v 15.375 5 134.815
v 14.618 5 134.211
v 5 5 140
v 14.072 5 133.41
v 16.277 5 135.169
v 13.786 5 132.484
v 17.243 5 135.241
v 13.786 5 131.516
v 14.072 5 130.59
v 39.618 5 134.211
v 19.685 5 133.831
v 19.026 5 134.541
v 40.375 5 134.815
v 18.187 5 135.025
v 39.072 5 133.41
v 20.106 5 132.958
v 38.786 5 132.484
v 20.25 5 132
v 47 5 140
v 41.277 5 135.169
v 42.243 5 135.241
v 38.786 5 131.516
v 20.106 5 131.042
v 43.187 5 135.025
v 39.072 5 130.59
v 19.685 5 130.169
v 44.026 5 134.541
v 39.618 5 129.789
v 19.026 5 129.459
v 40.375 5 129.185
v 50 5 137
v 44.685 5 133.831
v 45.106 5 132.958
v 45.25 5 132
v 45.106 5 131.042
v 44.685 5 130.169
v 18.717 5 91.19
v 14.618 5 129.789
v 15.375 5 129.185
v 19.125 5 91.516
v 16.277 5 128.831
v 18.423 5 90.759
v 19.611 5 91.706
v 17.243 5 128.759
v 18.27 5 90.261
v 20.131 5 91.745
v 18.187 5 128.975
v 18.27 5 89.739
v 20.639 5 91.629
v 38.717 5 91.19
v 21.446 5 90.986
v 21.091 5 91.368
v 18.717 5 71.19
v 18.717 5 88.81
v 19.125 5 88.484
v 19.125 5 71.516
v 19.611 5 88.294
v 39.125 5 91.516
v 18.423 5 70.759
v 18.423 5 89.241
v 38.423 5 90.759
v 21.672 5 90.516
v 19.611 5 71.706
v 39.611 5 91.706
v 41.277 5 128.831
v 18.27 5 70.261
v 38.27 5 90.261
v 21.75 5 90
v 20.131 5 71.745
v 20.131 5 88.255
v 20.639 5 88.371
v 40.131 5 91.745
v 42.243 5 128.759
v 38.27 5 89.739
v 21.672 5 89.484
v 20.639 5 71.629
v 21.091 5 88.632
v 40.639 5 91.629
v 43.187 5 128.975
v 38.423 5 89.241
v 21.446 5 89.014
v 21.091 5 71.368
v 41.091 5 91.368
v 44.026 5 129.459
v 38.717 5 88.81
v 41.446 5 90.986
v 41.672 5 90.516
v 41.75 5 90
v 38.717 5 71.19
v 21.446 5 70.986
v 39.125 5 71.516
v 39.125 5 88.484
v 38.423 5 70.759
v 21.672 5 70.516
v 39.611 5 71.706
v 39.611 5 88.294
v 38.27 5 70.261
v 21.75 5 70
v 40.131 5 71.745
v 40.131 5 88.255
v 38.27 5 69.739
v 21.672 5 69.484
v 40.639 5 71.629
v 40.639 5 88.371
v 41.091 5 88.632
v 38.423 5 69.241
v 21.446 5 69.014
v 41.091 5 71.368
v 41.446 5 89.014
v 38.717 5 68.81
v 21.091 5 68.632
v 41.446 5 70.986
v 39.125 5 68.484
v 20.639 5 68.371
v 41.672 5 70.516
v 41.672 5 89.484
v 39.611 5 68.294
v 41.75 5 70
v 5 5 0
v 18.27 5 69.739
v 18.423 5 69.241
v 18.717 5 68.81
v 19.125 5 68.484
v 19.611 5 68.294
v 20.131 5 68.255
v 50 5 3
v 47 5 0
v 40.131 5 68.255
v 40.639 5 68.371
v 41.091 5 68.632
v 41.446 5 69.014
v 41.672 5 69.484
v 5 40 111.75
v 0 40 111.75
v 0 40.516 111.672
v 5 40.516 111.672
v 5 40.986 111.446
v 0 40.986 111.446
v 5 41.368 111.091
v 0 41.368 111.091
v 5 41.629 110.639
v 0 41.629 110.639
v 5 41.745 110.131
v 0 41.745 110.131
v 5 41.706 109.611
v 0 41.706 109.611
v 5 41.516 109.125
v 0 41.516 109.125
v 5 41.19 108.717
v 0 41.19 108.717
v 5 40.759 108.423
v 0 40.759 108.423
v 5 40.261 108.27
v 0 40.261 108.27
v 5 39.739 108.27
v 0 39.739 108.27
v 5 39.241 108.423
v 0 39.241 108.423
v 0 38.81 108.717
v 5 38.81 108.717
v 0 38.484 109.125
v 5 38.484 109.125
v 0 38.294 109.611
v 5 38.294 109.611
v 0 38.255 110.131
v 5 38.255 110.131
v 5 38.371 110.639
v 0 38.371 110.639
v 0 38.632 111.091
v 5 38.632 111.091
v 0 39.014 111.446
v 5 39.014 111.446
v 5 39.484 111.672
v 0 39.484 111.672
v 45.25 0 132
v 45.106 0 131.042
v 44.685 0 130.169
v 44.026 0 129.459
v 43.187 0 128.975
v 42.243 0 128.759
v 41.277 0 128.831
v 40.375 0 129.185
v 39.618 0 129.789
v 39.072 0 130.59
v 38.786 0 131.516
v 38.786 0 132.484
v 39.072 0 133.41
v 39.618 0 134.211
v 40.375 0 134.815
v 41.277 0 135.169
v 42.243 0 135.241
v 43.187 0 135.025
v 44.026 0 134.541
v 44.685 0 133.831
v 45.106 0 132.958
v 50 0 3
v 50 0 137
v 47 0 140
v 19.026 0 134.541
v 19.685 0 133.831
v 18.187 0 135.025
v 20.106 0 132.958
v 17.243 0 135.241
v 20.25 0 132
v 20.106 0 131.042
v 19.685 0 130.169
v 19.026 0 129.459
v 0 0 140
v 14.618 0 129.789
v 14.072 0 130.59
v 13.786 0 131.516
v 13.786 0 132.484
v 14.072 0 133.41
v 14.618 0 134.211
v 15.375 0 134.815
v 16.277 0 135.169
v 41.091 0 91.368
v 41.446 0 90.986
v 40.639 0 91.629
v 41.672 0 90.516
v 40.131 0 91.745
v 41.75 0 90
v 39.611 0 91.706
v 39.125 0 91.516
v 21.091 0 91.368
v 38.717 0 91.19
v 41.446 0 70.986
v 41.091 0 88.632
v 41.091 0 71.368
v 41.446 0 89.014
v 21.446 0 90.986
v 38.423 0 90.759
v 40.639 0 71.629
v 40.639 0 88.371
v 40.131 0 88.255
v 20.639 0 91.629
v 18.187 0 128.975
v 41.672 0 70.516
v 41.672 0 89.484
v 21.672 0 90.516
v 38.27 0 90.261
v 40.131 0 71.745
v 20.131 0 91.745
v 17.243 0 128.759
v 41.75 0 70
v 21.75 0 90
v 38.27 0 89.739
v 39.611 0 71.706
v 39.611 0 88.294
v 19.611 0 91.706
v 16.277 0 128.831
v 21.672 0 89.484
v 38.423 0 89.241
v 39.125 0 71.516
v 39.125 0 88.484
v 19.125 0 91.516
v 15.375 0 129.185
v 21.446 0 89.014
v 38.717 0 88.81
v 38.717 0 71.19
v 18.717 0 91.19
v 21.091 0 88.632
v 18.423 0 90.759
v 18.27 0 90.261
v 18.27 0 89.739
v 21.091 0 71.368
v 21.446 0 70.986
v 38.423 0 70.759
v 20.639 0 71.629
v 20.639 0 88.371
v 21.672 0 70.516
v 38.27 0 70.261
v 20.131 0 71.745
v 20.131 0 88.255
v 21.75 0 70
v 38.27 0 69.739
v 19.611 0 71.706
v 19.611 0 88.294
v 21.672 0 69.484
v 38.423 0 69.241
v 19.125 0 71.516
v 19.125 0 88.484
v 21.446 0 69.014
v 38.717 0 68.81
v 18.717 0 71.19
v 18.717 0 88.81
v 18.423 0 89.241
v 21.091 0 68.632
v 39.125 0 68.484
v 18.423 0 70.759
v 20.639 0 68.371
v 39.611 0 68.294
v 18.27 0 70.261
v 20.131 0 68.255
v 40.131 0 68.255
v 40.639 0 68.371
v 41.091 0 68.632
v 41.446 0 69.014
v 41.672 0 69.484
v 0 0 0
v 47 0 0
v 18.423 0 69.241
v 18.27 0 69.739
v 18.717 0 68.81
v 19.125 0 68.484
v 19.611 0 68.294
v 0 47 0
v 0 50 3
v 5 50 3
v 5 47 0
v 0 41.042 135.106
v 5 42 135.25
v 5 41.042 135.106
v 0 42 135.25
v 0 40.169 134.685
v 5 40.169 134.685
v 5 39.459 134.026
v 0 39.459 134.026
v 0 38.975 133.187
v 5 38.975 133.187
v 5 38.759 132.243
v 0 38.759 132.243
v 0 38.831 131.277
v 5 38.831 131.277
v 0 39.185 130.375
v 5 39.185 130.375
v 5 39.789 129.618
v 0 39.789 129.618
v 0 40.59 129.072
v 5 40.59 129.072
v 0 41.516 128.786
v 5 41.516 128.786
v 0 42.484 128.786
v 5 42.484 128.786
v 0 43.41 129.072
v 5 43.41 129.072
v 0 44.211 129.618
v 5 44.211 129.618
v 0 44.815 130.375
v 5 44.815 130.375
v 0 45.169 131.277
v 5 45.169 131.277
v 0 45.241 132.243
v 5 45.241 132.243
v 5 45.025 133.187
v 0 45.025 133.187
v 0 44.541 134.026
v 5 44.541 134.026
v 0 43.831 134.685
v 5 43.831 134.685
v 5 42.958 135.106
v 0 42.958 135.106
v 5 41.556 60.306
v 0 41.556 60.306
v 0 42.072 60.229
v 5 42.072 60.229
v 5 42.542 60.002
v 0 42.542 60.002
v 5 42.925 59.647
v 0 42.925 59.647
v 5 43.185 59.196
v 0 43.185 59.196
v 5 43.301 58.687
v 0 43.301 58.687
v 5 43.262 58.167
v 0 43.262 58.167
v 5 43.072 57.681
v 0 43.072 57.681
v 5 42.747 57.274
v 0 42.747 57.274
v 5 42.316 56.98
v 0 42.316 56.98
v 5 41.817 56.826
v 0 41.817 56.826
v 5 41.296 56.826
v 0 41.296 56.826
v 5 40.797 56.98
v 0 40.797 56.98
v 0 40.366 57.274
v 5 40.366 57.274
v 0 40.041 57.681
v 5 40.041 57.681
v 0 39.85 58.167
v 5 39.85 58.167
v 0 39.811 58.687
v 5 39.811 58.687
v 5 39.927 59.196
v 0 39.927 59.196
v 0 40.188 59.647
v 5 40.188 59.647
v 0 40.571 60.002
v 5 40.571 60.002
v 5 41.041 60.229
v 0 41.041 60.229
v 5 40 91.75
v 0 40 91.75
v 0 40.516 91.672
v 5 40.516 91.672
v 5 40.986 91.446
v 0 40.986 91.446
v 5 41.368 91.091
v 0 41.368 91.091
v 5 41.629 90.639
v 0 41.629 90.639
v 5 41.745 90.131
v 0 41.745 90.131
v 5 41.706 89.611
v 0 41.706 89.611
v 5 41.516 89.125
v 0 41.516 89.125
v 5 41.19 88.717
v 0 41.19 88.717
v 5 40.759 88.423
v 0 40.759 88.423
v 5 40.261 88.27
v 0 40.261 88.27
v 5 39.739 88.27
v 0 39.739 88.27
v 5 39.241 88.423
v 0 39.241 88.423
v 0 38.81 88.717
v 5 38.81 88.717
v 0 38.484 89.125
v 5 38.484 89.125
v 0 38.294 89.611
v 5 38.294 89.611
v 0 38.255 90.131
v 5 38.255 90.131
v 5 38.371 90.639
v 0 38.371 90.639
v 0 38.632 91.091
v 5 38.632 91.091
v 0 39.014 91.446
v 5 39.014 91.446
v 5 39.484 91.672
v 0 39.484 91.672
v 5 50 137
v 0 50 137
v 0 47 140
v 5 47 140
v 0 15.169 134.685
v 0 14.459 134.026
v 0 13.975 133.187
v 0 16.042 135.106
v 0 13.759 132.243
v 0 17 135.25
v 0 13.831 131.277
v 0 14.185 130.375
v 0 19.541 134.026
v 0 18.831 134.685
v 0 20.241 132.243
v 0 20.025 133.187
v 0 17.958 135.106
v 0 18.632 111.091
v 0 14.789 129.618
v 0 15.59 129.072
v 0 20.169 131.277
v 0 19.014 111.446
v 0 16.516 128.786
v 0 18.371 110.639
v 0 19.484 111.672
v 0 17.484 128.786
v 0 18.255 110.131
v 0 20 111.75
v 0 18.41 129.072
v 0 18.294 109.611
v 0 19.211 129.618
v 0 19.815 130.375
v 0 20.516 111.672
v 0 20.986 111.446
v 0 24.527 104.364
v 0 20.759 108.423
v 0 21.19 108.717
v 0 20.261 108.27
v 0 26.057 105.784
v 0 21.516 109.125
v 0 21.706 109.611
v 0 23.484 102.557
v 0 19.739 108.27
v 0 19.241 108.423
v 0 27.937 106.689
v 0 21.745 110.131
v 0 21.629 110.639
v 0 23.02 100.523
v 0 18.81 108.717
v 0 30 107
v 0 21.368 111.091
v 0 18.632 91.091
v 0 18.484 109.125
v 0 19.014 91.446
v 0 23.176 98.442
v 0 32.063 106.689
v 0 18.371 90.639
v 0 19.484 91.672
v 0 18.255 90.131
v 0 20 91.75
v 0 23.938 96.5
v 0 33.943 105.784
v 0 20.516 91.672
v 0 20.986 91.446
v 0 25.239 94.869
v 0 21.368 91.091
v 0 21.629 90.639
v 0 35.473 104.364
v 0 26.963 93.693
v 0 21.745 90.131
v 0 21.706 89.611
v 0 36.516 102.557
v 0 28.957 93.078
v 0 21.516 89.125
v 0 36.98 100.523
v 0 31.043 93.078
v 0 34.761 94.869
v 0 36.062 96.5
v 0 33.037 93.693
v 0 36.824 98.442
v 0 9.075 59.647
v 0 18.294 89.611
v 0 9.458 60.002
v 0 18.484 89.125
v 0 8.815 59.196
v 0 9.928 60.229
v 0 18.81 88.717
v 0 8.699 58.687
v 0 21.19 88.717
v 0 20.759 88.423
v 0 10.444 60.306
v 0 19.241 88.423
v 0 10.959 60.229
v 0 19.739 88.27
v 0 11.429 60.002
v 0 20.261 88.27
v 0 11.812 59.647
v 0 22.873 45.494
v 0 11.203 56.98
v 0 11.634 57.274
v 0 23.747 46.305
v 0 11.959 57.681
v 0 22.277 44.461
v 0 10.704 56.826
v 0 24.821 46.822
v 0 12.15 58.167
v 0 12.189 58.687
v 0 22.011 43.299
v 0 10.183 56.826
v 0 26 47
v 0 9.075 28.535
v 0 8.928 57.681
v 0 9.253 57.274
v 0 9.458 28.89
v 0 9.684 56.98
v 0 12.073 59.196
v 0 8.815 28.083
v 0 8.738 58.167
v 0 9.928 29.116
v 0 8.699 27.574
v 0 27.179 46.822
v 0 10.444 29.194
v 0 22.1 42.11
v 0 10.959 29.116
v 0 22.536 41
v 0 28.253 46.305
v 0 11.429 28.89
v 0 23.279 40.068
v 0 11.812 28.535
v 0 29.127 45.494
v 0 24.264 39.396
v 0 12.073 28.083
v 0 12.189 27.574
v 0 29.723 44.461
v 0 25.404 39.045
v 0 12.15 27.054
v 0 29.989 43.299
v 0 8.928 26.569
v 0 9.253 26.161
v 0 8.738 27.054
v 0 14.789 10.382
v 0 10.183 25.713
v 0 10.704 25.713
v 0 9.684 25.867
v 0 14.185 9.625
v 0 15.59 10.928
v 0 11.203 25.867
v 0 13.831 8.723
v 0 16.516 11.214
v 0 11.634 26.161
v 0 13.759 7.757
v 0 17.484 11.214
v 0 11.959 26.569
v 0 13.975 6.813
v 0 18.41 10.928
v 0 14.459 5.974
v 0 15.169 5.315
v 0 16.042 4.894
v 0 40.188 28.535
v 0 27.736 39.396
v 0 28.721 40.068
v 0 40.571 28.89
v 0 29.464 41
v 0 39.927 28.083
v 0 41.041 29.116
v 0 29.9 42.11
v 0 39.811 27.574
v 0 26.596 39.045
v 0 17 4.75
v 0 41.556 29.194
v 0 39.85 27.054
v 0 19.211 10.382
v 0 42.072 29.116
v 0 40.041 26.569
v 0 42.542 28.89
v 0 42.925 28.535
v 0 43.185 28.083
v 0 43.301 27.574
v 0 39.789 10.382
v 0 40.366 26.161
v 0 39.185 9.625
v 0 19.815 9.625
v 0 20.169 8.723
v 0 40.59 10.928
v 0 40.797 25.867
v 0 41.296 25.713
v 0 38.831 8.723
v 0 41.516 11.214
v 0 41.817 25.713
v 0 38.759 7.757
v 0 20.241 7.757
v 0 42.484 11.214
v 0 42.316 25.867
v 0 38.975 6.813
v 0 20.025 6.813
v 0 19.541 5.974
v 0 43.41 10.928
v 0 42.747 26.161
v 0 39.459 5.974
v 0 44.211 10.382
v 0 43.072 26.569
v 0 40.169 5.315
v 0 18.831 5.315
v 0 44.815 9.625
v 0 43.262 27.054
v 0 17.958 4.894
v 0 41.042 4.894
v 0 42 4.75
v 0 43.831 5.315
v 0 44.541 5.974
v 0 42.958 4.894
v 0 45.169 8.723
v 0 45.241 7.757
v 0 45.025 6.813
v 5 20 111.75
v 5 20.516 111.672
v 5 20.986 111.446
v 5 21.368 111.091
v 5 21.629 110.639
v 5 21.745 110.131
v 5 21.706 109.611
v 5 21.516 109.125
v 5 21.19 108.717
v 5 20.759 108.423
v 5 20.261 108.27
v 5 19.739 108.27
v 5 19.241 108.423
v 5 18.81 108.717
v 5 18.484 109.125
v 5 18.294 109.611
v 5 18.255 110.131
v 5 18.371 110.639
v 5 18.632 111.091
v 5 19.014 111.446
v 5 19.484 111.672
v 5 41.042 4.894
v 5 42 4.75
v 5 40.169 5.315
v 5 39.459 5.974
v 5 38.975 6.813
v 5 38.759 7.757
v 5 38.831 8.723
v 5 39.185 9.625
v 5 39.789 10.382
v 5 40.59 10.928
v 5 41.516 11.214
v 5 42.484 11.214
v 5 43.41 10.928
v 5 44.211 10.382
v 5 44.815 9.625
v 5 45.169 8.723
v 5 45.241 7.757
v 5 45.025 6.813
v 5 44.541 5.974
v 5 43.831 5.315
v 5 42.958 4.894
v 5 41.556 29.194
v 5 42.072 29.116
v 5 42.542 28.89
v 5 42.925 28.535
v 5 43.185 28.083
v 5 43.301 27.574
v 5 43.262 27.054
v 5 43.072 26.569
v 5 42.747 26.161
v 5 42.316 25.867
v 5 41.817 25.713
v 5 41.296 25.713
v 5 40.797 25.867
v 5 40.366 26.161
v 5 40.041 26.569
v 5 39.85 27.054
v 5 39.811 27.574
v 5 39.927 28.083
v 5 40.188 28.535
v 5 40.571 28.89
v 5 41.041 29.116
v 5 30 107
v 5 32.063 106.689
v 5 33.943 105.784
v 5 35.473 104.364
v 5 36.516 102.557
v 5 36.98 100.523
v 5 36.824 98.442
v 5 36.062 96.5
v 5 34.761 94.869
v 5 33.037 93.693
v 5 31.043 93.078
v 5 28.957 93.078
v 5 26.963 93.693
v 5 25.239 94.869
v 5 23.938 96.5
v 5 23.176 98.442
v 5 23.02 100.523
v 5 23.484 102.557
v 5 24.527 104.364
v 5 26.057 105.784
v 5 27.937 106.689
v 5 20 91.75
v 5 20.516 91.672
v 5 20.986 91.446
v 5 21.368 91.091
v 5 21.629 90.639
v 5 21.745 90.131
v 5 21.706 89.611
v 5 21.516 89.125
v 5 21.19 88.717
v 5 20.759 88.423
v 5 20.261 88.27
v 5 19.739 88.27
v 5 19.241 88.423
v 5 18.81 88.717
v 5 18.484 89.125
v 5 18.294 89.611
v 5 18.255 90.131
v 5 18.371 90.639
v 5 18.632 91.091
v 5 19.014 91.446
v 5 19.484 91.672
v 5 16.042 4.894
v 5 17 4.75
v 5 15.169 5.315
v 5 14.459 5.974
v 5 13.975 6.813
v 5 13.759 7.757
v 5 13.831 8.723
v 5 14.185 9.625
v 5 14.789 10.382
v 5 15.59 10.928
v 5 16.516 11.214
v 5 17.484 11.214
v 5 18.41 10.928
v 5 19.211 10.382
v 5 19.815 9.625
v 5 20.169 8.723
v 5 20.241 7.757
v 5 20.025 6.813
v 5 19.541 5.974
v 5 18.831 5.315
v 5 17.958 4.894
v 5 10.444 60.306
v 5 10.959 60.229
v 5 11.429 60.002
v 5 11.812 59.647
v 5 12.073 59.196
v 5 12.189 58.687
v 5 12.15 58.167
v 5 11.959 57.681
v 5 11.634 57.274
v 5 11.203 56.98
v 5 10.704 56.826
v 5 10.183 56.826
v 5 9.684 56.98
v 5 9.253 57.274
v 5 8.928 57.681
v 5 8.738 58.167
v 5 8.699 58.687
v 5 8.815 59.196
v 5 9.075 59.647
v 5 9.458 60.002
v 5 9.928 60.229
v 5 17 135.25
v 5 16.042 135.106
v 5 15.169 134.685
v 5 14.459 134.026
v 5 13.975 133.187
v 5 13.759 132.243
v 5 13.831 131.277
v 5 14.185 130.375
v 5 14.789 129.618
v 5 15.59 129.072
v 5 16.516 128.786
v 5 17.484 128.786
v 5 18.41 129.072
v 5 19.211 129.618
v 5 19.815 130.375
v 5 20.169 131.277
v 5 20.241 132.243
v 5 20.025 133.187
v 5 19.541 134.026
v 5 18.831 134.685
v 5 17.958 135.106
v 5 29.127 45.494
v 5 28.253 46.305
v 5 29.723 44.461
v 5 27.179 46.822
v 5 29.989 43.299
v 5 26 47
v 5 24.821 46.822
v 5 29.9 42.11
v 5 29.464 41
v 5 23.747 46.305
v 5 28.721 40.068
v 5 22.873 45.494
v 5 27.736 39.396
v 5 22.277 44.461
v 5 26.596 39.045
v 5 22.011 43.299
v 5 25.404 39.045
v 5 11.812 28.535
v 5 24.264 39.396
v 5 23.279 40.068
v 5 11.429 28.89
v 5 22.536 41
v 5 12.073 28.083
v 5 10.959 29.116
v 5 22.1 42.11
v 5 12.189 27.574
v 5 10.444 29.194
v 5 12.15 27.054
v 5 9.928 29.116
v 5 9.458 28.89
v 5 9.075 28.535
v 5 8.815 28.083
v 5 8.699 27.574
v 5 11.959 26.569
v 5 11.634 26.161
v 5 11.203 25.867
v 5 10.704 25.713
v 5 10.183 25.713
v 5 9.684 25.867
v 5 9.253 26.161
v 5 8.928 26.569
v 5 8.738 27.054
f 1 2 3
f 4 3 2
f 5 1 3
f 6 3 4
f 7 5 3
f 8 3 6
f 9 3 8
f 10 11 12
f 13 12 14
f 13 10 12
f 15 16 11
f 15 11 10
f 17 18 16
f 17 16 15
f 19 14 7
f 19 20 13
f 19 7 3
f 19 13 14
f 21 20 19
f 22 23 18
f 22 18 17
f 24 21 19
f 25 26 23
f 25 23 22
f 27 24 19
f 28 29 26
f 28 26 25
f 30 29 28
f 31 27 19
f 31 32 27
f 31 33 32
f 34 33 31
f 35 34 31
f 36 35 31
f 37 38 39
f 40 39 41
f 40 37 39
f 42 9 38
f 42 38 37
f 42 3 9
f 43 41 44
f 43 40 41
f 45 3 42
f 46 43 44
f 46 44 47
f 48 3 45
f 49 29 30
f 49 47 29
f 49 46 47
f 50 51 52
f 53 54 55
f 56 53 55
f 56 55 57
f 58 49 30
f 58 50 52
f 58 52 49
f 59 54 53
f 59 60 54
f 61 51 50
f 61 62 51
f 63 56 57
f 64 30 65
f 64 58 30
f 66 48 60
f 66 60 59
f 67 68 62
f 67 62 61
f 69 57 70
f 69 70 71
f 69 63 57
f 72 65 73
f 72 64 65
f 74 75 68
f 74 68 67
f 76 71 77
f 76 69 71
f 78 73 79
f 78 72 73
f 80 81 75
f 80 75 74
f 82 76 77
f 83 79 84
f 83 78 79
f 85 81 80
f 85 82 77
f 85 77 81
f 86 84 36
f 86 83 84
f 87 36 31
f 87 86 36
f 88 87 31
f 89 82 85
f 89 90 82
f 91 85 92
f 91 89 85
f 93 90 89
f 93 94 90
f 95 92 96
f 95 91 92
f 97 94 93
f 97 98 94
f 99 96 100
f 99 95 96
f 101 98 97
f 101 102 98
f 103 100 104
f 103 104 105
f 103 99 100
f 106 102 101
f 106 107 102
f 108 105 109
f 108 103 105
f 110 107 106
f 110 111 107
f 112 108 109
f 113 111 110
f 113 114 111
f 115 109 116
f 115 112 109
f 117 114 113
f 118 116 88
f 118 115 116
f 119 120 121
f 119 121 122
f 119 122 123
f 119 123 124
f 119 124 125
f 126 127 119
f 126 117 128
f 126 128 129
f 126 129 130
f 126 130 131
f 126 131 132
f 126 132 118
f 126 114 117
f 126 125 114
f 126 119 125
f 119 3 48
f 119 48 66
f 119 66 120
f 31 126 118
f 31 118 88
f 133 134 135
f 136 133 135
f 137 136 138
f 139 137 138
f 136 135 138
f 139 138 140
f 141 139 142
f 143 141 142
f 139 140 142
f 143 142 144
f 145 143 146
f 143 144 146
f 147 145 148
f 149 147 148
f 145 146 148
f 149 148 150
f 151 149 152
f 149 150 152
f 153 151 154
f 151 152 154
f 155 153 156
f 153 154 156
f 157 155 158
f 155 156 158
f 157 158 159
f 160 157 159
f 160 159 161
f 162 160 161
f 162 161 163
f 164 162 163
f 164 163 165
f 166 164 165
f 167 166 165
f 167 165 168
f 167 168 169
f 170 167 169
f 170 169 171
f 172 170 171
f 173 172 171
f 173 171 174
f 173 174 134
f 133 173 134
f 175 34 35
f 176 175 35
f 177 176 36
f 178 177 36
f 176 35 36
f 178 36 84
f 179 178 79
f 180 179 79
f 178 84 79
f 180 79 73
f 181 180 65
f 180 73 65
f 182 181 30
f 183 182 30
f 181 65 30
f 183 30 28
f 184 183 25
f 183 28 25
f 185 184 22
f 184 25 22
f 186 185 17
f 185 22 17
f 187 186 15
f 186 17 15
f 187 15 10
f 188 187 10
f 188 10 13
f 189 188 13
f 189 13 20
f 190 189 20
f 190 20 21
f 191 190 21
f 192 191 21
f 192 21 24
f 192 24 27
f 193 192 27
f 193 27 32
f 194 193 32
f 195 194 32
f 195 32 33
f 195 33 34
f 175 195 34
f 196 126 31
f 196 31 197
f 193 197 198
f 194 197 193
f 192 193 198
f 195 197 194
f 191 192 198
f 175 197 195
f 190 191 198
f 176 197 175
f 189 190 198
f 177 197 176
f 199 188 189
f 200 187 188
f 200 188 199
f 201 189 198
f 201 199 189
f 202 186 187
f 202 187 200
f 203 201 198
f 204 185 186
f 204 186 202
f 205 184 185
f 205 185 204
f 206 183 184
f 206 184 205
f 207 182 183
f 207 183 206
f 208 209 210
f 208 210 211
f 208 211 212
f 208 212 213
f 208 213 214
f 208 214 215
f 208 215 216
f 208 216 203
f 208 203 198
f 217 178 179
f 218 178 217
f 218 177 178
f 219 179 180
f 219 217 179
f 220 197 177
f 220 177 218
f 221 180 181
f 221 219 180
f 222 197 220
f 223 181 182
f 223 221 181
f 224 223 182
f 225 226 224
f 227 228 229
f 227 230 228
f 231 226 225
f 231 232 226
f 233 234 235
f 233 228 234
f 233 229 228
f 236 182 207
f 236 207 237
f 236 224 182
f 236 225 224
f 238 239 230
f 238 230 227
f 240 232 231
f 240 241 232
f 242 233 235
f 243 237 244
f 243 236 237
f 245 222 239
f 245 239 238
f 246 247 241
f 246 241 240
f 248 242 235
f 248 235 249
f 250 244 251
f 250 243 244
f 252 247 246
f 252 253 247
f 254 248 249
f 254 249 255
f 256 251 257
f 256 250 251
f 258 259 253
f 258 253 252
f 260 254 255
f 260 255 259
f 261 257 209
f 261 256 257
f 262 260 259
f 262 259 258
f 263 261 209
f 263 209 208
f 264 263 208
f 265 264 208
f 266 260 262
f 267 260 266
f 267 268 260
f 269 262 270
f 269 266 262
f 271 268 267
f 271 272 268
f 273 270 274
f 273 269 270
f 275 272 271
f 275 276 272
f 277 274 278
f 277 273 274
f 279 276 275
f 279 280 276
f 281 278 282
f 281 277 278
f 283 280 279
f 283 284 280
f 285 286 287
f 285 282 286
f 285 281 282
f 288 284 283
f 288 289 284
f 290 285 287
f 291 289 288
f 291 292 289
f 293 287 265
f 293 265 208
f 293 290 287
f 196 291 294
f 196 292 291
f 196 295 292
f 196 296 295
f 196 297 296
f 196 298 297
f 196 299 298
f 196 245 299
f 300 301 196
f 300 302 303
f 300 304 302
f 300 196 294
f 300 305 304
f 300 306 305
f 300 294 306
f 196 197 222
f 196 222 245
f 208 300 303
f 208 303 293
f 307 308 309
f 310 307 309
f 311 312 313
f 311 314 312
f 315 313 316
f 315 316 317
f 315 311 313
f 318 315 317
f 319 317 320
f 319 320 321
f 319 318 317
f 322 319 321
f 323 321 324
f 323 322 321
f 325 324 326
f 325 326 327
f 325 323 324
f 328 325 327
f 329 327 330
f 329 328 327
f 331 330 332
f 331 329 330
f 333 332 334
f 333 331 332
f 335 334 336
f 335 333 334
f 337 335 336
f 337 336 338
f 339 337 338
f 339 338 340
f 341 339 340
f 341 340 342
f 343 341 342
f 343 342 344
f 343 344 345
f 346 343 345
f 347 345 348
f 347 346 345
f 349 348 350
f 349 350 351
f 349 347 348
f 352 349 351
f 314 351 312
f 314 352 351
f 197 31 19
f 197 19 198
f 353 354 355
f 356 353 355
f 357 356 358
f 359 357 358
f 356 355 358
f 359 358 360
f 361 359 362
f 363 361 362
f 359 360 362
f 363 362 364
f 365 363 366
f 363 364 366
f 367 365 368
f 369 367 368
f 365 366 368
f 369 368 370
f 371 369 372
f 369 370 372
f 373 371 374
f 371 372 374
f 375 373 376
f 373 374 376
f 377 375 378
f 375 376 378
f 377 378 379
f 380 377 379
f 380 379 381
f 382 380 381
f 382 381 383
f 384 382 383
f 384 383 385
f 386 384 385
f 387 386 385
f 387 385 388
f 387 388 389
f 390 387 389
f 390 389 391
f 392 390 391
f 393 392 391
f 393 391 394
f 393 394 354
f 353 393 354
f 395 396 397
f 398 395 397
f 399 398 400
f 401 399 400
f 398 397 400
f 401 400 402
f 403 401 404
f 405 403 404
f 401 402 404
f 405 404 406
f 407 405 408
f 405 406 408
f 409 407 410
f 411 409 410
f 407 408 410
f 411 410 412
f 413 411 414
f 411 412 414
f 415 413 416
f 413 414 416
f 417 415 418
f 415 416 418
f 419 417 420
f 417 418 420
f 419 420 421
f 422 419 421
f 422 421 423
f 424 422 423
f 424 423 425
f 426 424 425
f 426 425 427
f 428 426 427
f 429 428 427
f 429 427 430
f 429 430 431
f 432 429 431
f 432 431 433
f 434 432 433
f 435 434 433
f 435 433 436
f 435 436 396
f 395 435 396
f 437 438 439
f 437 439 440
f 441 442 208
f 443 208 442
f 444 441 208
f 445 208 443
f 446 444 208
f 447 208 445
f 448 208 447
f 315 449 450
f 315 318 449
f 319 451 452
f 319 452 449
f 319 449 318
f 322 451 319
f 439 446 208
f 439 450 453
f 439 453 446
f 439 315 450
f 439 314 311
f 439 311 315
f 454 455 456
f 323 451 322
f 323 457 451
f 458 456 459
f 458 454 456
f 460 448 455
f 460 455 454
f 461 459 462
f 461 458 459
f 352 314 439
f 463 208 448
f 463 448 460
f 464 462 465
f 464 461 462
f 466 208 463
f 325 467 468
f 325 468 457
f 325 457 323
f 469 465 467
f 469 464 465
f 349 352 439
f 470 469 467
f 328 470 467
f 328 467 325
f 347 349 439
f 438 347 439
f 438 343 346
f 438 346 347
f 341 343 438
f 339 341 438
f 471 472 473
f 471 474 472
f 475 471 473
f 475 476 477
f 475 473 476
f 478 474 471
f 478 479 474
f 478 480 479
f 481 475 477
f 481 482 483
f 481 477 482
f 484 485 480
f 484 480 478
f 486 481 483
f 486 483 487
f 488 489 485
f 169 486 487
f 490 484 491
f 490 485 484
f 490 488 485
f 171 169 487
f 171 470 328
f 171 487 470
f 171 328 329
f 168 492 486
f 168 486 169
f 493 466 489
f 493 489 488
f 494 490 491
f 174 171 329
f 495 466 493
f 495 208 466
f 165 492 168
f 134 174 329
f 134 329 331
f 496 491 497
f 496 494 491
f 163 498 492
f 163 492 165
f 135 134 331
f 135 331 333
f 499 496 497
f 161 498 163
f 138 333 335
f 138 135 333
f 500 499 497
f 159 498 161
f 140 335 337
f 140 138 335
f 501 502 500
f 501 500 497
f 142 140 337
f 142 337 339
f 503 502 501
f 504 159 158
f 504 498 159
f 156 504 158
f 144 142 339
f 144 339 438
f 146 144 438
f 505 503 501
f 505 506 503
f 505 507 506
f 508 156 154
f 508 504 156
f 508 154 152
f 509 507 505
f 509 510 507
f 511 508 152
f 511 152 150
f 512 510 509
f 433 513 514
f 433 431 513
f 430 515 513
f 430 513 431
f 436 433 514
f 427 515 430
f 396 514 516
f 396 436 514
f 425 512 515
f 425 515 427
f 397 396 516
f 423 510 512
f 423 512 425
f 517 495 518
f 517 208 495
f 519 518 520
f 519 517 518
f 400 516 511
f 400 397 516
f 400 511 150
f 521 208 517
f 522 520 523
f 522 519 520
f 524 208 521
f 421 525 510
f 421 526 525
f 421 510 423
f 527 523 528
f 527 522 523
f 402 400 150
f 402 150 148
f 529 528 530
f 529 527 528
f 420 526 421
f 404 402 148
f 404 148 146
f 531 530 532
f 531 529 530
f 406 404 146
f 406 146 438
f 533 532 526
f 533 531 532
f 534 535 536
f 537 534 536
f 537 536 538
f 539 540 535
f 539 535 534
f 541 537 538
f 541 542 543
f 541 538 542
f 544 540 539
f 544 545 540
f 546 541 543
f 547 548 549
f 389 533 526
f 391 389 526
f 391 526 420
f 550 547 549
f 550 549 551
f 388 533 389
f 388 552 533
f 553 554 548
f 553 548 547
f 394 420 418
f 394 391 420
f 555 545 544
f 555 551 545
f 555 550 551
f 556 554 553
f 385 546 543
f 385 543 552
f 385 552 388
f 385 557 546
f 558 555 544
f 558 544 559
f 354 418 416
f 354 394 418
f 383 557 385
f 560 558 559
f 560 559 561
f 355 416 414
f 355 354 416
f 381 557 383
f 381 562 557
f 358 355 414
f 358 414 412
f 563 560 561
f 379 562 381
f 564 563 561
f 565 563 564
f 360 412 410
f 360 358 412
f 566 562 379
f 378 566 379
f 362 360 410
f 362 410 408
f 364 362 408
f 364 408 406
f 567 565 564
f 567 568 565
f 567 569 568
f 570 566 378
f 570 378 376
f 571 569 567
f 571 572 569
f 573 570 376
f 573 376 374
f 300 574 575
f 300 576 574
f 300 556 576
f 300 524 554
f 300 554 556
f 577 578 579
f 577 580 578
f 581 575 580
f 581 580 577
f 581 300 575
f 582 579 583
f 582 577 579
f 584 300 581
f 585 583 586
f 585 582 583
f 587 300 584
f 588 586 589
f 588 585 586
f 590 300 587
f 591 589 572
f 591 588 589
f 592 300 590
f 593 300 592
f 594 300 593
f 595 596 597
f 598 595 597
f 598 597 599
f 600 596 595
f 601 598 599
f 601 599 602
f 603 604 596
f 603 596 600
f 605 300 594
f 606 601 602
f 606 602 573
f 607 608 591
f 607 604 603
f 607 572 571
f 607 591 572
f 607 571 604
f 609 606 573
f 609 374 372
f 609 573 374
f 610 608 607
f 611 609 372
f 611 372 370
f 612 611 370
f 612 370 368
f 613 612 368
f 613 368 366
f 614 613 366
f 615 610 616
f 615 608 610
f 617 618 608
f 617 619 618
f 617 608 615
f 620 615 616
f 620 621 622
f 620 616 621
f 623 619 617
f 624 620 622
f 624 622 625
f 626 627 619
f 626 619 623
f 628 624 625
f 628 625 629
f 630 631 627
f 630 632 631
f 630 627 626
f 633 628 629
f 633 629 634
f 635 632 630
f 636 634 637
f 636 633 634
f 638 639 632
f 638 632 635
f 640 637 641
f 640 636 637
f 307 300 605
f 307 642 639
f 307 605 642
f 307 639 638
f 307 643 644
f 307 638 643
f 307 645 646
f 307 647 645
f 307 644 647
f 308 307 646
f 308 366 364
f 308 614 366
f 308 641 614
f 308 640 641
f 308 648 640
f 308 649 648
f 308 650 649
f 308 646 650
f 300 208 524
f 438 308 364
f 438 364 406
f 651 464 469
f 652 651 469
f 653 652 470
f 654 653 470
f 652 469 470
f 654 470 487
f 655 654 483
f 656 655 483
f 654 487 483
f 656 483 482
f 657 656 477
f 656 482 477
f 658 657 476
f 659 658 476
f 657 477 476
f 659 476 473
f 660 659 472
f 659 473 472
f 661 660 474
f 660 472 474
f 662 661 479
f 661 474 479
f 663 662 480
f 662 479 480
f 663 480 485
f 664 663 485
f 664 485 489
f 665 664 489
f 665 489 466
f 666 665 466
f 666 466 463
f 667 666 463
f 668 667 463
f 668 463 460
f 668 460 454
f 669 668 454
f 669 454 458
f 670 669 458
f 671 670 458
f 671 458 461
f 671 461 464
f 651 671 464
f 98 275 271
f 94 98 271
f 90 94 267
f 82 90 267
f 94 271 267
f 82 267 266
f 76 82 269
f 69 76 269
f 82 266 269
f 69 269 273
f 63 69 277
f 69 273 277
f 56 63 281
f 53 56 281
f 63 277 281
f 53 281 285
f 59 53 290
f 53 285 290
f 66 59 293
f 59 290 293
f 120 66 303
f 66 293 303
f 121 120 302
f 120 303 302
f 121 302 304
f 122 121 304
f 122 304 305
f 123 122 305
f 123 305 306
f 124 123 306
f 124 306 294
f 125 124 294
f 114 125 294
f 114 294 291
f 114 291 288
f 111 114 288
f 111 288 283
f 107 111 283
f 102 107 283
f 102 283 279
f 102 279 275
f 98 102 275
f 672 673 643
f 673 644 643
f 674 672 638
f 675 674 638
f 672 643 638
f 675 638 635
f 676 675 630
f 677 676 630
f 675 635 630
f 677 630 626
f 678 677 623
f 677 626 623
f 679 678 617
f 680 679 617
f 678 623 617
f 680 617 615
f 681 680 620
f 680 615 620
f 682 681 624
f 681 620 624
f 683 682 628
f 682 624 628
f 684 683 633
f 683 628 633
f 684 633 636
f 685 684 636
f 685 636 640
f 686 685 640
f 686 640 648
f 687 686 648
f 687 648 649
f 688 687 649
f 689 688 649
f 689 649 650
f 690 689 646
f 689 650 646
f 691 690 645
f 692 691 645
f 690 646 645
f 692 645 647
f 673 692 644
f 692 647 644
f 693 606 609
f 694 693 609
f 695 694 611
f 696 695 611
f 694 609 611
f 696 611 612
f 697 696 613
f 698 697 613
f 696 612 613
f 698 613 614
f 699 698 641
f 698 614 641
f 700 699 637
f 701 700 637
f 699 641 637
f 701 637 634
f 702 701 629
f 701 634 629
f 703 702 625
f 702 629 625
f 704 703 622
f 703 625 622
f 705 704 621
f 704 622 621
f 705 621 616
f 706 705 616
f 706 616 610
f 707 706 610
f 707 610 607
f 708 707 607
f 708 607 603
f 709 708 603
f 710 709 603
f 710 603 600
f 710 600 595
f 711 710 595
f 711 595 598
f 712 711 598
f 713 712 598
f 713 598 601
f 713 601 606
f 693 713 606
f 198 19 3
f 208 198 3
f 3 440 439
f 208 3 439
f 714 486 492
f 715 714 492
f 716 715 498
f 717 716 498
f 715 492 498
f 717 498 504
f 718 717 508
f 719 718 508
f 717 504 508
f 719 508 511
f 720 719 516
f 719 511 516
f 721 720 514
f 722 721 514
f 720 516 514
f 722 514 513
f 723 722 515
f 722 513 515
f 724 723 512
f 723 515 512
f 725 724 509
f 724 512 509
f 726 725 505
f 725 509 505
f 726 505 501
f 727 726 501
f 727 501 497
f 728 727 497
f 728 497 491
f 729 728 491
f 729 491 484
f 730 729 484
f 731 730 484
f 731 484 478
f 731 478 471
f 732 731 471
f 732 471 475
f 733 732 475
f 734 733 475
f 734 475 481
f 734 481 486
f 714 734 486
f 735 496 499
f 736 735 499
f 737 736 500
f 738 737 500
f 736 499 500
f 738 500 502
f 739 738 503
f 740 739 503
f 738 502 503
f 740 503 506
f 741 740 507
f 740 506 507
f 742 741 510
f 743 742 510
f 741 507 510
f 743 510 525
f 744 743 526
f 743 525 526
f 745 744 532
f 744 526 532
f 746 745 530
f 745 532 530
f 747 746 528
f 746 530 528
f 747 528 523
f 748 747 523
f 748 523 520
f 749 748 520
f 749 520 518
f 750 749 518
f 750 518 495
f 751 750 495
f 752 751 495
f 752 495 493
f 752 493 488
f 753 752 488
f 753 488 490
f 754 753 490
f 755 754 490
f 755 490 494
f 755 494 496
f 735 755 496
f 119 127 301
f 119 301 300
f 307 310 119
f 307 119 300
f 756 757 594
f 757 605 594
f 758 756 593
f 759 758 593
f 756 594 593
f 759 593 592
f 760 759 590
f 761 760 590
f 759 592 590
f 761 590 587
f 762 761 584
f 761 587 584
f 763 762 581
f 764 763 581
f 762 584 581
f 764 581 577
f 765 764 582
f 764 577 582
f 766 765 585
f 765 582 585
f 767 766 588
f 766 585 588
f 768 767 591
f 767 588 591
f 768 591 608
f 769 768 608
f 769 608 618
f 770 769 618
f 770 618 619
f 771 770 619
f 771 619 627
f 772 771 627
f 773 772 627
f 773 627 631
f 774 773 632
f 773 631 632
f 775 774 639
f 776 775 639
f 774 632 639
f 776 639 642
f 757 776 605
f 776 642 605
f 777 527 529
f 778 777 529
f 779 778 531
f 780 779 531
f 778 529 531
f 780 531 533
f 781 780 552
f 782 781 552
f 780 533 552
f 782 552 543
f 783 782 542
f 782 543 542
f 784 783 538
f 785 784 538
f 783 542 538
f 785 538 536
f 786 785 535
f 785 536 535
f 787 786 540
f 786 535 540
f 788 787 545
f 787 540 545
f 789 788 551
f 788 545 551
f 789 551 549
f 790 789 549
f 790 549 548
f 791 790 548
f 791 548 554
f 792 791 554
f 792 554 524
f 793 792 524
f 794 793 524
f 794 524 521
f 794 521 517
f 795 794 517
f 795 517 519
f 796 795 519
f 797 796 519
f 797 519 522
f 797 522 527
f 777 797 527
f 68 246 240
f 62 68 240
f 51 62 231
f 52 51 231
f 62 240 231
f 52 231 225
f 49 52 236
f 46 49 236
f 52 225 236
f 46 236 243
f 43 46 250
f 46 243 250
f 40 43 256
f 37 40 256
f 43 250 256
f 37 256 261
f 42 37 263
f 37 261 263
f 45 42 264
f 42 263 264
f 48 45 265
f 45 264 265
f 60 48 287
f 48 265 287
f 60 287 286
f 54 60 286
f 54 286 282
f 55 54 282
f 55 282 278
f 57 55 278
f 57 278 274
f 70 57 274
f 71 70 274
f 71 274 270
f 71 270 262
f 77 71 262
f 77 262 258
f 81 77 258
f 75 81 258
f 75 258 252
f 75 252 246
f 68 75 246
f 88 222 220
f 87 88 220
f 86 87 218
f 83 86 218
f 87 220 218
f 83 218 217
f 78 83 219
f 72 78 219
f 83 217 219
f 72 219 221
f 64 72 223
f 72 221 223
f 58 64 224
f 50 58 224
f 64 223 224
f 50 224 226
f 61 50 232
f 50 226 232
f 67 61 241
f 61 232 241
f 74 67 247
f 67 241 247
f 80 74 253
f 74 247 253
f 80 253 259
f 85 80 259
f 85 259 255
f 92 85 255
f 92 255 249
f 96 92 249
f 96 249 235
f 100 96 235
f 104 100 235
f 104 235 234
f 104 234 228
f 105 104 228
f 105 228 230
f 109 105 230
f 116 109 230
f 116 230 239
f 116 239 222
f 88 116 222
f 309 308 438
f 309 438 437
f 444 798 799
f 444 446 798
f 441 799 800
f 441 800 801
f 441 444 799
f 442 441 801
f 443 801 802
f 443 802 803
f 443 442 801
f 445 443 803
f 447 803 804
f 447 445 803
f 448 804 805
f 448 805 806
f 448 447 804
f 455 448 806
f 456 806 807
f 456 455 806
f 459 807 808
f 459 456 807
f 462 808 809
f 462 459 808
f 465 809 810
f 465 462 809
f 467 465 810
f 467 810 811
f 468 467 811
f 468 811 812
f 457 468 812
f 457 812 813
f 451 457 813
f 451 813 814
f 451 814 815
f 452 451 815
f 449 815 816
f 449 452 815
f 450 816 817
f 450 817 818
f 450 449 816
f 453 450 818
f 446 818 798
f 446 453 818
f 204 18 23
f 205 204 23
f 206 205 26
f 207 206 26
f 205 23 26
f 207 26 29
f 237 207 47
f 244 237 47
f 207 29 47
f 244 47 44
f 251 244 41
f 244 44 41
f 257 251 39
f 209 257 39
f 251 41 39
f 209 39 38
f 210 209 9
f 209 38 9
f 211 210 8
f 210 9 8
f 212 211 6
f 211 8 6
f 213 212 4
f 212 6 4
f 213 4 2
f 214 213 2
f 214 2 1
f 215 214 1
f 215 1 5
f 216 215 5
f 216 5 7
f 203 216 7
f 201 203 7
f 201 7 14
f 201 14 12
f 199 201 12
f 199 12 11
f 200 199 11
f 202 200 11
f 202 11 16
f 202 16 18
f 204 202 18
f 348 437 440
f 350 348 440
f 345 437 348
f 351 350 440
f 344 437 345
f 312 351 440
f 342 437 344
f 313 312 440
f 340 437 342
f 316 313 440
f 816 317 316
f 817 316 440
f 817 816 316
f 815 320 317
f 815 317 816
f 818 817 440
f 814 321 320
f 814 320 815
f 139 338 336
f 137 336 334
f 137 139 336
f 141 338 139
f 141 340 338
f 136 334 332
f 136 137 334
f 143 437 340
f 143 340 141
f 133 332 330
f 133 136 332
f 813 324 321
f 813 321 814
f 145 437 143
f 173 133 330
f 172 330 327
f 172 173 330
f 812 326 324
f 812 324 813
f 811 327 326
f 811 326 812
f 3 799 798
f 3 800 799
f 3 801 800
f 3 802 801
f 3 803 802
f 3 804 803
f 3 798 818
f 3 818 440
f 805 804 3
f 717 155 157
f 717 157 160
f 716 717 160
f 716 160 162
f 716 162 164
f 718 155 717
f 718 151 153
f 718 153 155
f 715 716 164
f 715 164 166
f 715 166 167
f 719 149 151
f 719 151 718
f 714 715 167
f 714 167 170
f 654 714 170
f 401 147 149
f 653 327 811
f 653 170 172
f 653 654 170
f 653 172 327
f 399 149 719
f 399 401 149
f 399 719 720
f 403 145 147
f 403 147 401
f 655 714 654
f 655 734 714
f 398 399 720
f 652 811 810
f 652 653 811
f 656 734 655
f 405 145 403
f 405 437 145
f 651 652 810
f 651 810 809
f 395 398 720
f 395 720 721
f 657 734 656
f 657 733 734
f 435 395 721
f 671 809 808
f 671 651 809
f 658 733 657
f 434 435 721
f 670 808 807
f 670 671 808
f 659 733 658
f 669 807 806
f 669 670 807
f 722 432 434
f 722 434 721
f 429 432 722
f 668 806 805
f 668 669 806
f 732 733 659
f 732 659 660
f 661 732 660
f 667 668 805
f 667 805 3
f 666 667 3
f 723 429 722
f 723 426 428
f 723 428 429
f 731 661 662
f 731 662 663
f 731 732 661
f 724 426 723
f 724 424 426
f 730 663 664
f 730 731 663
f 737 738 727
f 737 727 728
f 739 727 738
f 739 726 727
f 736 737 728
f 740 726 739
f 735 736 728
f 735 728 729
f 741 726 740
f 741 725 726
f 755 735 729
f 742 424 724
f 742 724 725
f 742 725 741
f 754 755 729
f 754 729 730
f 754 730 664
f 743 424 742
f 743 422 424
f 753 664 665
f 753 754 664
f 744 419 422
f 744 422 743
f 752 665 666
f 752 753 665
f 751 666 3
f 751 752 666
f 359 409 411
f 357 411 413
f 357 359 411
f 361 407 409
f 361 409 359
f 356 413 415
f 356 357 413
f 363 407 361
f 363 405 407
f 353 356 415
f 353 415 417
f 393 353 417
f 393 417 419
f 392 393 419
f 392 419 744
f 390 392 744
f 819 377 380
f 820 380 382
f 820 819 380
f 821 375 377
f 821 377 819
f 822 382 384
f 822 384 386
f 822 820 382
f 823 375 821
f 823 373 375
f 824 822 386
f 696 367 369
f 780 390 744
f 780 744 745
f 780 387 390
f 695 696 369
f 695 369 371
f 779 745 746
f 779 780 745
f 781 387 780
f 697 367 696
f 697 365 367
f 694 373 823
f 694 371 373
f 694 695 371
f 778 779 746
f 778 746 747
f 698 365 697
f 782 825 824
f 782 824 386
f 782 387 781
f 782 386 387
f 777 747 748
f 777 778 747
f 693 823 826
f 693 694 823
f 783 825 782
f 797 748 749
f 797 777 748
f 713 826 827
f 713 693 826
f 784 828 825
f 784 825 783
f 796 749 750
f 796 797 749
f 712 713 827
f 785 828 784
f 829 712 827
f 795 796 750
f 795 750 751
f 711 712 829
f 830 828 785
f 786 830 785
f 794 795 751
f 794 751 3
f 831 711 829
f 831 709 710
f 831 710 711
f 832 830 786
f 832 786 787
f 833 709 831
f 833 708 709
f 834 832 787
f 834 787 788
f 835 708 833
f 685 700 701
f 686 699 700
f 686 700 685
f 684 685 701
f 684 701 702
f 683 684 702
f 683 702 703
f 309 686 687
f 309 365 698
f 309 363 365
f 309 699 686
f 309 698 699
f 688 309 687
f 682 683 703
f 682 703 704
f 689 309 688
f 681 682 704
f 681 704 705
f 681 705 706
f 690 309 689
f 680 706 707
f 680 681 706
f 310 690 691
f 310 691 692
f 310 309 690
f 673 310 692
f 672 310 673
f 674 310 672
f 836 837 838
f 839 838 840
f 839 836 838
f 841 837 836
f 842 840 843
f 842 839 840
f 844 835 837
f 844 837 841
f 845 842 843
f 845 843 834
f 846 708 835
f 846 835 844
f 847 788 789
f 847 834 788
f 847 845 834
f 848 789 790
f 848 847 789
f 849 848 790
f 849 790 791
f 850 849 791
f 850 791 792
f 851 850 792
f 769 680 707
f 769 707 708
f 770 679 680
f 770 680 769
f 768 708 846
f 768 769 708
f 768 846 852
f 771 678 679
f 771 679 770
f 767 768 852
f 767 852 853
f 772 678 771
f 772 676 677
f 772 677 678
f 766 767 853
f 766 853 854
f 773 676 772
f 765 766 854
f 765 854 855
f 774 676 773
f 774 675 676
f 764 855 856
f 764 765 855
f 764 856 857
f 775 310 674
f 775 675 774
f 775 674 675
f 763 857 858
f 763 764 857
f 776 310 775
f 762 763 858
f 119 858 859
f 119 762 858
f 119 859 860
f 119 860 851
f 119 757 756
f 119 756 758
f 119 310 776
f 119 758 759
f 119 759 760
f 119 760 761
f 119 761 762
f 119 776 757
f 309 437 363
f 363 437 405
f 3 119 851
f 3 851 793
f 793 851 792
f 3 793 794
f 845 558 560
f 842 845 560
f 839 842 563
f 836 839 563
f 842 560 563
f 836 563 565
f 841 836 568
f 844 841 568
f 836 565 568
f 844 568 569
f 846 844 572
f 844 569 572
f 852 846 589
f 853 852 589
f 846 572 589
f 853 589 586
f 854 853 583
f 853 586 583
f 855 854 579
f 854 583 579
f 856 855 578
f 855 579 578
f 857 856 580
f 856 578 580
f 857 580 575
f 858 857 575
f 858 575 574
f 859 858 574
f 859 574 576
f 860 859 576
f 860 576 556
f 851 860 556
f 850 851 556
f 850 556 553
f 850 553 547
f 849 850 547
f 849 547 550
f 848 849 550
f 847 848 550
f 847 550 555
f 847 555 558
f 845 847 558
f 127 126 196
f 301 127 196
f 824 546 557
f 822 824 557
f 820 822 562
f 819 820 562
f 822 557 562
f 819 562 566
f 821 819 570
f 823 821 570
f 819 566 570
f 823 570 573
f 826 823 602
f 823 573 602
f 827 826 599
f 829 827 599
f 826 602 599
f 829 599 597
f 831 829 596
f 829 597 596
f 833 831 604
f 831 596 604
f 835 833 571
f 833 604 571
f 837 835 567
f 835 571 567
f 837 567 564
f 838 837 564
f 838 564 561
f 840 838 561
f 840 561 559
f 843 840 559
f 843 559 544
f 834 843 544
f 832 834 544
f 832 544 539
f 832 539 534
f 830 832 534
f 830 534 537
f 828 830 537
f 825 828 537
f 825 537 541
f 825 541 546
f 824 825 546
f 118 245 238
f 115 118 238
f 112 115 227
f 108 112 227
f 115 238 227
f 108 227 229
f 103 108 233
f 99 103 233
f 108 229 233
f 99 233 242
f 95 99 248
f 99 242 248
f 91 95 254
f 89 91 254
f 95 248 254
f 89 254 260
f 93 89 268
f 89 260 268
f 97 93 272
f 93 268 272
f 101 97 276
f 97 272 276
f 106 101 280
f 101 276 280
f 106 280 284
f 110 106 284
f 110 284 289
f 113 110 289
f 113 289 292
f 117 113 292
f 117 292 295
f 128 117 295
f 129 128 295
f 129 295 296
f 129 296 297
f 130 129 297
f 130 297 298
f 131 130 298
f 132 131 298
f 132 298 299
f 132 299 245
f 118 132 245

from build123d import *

# Parameters (mm, degrees)
ESTRUSIONE_ESTRUSIONE1_DEPTH = 140
FORO_6_5_6_5_1_D             = 6.5
FORO_6_5_6_5_2_AT_2_COUNT    = 2
FORO_6_5_6_5_2_AT_2_PITCH    = 25
TAGLIO_ESTRUSIONE1_REACH     = 158.844
SCHIZZO8_R                   = 1.75
TAGLIO_ESTRUSIONE2_REACH     = 158.844
SCHIZZO9_R                   = 1.75
SCHIZZO9_R_2                 = 7
TAGLIO_ESTRUSIONE4_REACH     = 158.844
SCHIZZO11_R                  = 4
SCHIZZO11_R_2                = 1.75
SMUSSO1_SIZE                 = 3


with BuildPart() as part:
    # Schizzo1 → Estrusione-Estrusione1 (new body)
    with BuildSketch(Plane.XY):
        Polygon((0, 0), (0, 50), (5, 50), (5, 5), (50, 5), (50, 0), align=None)
    extrude(amount=ESTRUSIONE_ESTRUSIONE1_DEPTH)

    # Foro Ø6.5 (6.5)-1 (through all)
    with Locations(Plane(origin=(0, 0, 0), x_dir=(-1, 0, 0), z_dir=(0, -1, 0))):
        with Locations((-17, -132), (-42, -132)):
            Hole(FORO_6_5_6_5_1_D / 2)

    # Schizzo6 → Foro Ø6.5 (6.5)-2 (revolve, cut)
    with BuildSketch(Plane(origin=(0, 42, 132), x_dir=(0, 0, 1), z_dir=(0, 1, 0))):
        Polygon((0, 0), (0, 6.952797012), (3.25, 5), (3.25, 0), align=None)
    foro_6_5_6_5_2 = revolve(axis=Axis((-6.35, 42, 132), (1, 0, 0)), mode=Mode.SUBTRACT)

    # Foro Ø6.5 (6.5)-2 at 2: Foro Ø6.5 (6.5)-2 ×2
    with Locations(*[(0, -i * FORO_6_5_6_5_2_AT_2_PITCH, 0) for i in range(1, FORO_6_5_6_5_2_AT_2_COUNT)]):
        add(foro_6_5_6_5_2, mode=Mode.SUBTRACT)

    # Specchia1: Foro Ø6.5 (6.5)-2 across plane
    add(foro_6_5_6_5_2.mirror(Plane.XY.offset(70)), mode=Mode.SUBTRACT)

    # Specchia1 copy 1 sketch → Specchia1 copy 1 (revolve, cut)
    with BuildSketch(Plane(origin=(0, 17, 8), x_dir=(0, 0, -1), z_dir=(0, 1, 0))):
        Polygon((0, 0), (0, -6.952797012), (3.25, -5), (3.25, 0), align=None)
    revolve(axis=Axis((-6.35, 17, 8), (-1, 0, 0)), mode=Mode.SUBTRACT)

    # Schizzo8 → Taglio-Estrusione1 (cut, up to next)
    with BuildSketch(Plane.XZ, mode=Mode.PRIVATE) as taglio_estrusione1_sk1:
        with Locations((20, 70)):
            Circle(SCHIZZO8_R)
    taglio_estrusione1_tool1 = extrude(taglio_estrusione1_sk1.sketch, amount=-TAGLIO_ESTRUSIONE1_REACH, mode=Mode.PRIVATE) & part.part
    # Schizzo8 → Taglio-Estrusione1 (cut, up to next)
    with BuildSketch(Plane.XZ, mode=Mode.PRIVATE) as taglio_estrusione1_sk2:
        with Locations((20, 90)):
            Circle(SCHIZZO8_R)
    taglio_estrusione1_tool2 = extrude(taglio_estrusione1_sk2.sketch, amount=-TAGLIO_ESTRUSIONE1_REACH, mode=Mode.PRIVATE) & part.part
    # Schizzo8 → Taglio-Estrusione1 (cut, up to next)
    with BuildSketch(Plane.XZ, mode=Mode.PRIVATE) as taglio_estrusione1_sk3:
        with Locations((40, 90)):
            Circle(SCHIZZO8_R)
    taglio_estrusione1_tool3 = extrude(taglio_estrusione1_sk3.sketch, amount=-TAGLIO_ESTRUSIONE1_REACH, mode=Mode.PRIVATE) & part.part
    # Schizzo8 → Taglio-Estrusione1 (cut, up to next)
    with BuildSketch(Plane.XZ, mode=Mode.PRIVATE) as taglio_estrusione1_sk4:
        with Locations((40, 70)):
            Circle(SCHIZZO8_R)
    taglio_estrusione1_tool4 = extrude(taglio_estrusione1_sk4.sketch, amount=-TAGLIO_ESTRUSIONE1_REACH, mode=Mode.PRIVATE) & part.part
    add(taglio_estrusione1_tool1.solids().sort_by_distance((20, 0, 70))[0], mode=Mode.SUBTRACT)
    add(taglio_estrusione1_tool2.solids().sort_by_distance((20, 0, 90))[0], mode=Mode.SUBTRACT)
    add(taglio_estrusione1_tool3.solids().sort_by_distance((40, 0, 90))[0], mode=Mode.SUBTRACT)
    add(taglio_estrusione1_tool4.solids().sort_by_distance((40, 0, 70))[0], mode=Mode.SUBTRACT)

    # Schizzo9 → Taglio-Estrusione2 (cut, up to next)
    with BuildSketch(Plane.ZY, mode=Mode.PRIVATE) as taglio_estrusione2_sk1:
        with Locations((90, 40)):
            Circle(SCHIZZO9_R)
    taglio_estrusione2_tool1 = extrude(taglio_estrusione2_sk1.sketch, amount=-TAGLIO_ESTRUSIONE2_REACH, mode=Mode.PRIVATE) & part.part
    # Schizzo9 → Taglio-Estrusione2 (cut, up to next)
    with BuildSketch(Plane.ZY, mode=Mode.PRIVATE) as taglio_estrusione2_sk2:
        with Locations((110, 40)):
            Circle(SCHIZZO9_R)
    taglio_estrusione2_tool2 = extrude(taglio_estrusione2_sk2.sketch, amount=-TAGLIO_ESTRUSIONE2_REACH, mode=Mode.PRIVATE) & part.part
    # Schizzo9 → Taglio-Estrusione2 (cut, up to next)
    with BuildSketch(Plane.ZY, mode=Mode.PRIVATE) as taglio_estrusione2_sk3:
        with Locations((110, 20)):
            Circle(SCHIZZO9_R)
    taglio_estrusione2_tool3 = extrude(taglio_estrusione2_sk3.sketch, amount=-TAGLIO_ESTRUSIONE2_REACH, mode=Mode.PRIVATE) & part.part
    # Schizzo9 → Taglio-Estrusione2 (cut, up to next)
    with BuildSketch(Plane.ZY, mode=Mode.PRIVATE) as taglio_estrusione2_sk4:
        with Locations((90, 20)):
            Circle(SCHIZZO9_R)
    taglio_estrusione2_tool4 = extrude(taglio_estrusione2_sk4.sketch, amount=-TAGLIO_ESTRUSIONE2_REACH, mode=Mode.PRIVATE) & part.part
    # Schizzo9 → Taglio-Estrusione2 (cut, up to next)
    with BuildSketch(Plane.ZY, mode=Mode.PRIVATE) as taglio_estrusione2_sk5:
        with Locations((100, 30)):
            Circle(SCHIZZO9_R_2)
    taglio_estrusione2_tool5 = extrude(taglio_estrusione2_sk5.sketch, amount=-TAGLIO_ESTRUSIONE2_REACH, mode=Mode.PRIVATE) & part.part
    add(taglio_estrusione2_tool1.solids().sort_by_distance((0, 40, 90))[0], mode=Mode.SUBTRACT)
    add(taglio_estrusione2_tool2.solids().sort_by_distance((0, 40, 110))[0], mode=Mode.SUBTRACT)
    add(taglio_estrusione2_tool3.solids().sort_by_distance((0, 20, 110))[0], mode=Mode.SUBTRACT)
    add(taglio_estrusione2_tool4.solids().sort_by_distance((0, 20, 90))[0], mode=Mode.SUBTRACT)
    add(taglio_estrusione2_tool5.solids().sort_by_distance((0, 30, 100))[0], mode=Mode.SUBTRACT)

    # Schizzo11 → Taglio-Estrusione4 (cut, up to next)
    with BuildSketch(Plane.ZY, mode=Mode.PRIVATE) as taglio_estrusione4_sk1:
        with Locations((43, 26)):
            Circle(SCHIZZO11_R)
    taglio_estrusione4_tool1 = extrude(taglio_estrusione4_sk1.sketch, amount=-TAGLIO_ESTRUSIONE4_REACH, mode=Mode.PRIVATE) & part.part
    # Schizzo11 → Taglio-Estrusione4 (cut, up to next)
    with BuildSketch(Plane.ZY, mode=Mode.PRIVATE) as taglio_estrusione4_sk2:
        with Locations((58.556349186, 41.556349186)):
            Circle(SCHIZZO11_R_2)
    taglio_estrusione4_tool2 = extrude(taglio_estrusione4_sk2.sketch, amount=-TAGLIO_ESTRUSIONE4_REACH, mode=Mode.PRIVATE) & part.part
    # Schizzo11 → Taglio-Estrusione4 (cut, up to next)
    with BuildSketch(Plane.ZY, mode=Mode.PRIVATE) as taglio_estrusione4_sk3:
        with Locations((58.556349186, 10.443650814)):
            Circle(SCHIZZO11_R_2)
    taglio_estrusione4_tool3 = extrude(taglio_estrusione4_sk3.sketch, amount=-TAGLIO_ESTRUSIONE4_REACH, mode=Mode.PRIVATE) & part.part
    # Schizzo11 → Taglio-Estrusione4 (cut, up to next)
    with BuildSketch(Plane.ZY, mode=Mode.PRIVATE) as taglio_estrusione4_sk4:
        with Locations((27.443650814, 10.443650814)):
            Circle(SCHIZZO11_R_2)
    taglio_estrusione4_tool4 = extrude(taglio_estrusione4_sk4.sketch, amount=-TAGLIO_ESTRUSIONE4_REACH, mode=Mode.PRIVATE) & part.part
    # Schizzo11 → Taglio-Estrusione4 (cut, up to next)
    with BuildSketch(Plane.ZY, mode=Mode.PRIVATE) as taglio_estrusione4_sk5:
        with Locations((27.443650814, 41.556349186)):
            Circle(SCHIZZO11_R_2)
    taglio_estrusione4_tool5 = extrude(taglio_estrusione4_sk5.sketch, amount=-TAGLIO_ESTRUSIONE4_REACH, mode=Mode.PRIVATE) & part.part
    add(taglio_estrusione4_tool1.solids().sort_by_distance((0, 26, 43))[0], mode=Mode.SUBTRACT)
    add(taglio_estrusione4_tool2.solids().sort_by_distance((0, 41.556349, 58.556349))[0], mode=Mode.SUBTRACT)
    add(taglio_estrusione4_tool3.solids().sort_by_distance((0, 10.443651, 58.556349))[0], mode=Mode.SUBTRACT)
    add(taglio_estrusione4_tool4.solids().sort_by_distance((0, 10.443651, 27.443651))[0], mode=Mode.SUBTRACT)
    add(taglio_estrusione4_tool5.solids().sort_by_distance((0, 41.556349, 27.443651))[0], mode=Mode.SUBTRACT)

    # Smusso1
    smusso1_edges = [part.edges().sort_by_distance(p)[0] for p in [
        (2.5, 50, 140),
        (2.5, 50, 0),
        (50, 2.5, 140),
        (50, 2.5, 0),
    ]]
    chamfer(smusso1_edges, length=SMUSSO1_SIZE)


solid = part.part
